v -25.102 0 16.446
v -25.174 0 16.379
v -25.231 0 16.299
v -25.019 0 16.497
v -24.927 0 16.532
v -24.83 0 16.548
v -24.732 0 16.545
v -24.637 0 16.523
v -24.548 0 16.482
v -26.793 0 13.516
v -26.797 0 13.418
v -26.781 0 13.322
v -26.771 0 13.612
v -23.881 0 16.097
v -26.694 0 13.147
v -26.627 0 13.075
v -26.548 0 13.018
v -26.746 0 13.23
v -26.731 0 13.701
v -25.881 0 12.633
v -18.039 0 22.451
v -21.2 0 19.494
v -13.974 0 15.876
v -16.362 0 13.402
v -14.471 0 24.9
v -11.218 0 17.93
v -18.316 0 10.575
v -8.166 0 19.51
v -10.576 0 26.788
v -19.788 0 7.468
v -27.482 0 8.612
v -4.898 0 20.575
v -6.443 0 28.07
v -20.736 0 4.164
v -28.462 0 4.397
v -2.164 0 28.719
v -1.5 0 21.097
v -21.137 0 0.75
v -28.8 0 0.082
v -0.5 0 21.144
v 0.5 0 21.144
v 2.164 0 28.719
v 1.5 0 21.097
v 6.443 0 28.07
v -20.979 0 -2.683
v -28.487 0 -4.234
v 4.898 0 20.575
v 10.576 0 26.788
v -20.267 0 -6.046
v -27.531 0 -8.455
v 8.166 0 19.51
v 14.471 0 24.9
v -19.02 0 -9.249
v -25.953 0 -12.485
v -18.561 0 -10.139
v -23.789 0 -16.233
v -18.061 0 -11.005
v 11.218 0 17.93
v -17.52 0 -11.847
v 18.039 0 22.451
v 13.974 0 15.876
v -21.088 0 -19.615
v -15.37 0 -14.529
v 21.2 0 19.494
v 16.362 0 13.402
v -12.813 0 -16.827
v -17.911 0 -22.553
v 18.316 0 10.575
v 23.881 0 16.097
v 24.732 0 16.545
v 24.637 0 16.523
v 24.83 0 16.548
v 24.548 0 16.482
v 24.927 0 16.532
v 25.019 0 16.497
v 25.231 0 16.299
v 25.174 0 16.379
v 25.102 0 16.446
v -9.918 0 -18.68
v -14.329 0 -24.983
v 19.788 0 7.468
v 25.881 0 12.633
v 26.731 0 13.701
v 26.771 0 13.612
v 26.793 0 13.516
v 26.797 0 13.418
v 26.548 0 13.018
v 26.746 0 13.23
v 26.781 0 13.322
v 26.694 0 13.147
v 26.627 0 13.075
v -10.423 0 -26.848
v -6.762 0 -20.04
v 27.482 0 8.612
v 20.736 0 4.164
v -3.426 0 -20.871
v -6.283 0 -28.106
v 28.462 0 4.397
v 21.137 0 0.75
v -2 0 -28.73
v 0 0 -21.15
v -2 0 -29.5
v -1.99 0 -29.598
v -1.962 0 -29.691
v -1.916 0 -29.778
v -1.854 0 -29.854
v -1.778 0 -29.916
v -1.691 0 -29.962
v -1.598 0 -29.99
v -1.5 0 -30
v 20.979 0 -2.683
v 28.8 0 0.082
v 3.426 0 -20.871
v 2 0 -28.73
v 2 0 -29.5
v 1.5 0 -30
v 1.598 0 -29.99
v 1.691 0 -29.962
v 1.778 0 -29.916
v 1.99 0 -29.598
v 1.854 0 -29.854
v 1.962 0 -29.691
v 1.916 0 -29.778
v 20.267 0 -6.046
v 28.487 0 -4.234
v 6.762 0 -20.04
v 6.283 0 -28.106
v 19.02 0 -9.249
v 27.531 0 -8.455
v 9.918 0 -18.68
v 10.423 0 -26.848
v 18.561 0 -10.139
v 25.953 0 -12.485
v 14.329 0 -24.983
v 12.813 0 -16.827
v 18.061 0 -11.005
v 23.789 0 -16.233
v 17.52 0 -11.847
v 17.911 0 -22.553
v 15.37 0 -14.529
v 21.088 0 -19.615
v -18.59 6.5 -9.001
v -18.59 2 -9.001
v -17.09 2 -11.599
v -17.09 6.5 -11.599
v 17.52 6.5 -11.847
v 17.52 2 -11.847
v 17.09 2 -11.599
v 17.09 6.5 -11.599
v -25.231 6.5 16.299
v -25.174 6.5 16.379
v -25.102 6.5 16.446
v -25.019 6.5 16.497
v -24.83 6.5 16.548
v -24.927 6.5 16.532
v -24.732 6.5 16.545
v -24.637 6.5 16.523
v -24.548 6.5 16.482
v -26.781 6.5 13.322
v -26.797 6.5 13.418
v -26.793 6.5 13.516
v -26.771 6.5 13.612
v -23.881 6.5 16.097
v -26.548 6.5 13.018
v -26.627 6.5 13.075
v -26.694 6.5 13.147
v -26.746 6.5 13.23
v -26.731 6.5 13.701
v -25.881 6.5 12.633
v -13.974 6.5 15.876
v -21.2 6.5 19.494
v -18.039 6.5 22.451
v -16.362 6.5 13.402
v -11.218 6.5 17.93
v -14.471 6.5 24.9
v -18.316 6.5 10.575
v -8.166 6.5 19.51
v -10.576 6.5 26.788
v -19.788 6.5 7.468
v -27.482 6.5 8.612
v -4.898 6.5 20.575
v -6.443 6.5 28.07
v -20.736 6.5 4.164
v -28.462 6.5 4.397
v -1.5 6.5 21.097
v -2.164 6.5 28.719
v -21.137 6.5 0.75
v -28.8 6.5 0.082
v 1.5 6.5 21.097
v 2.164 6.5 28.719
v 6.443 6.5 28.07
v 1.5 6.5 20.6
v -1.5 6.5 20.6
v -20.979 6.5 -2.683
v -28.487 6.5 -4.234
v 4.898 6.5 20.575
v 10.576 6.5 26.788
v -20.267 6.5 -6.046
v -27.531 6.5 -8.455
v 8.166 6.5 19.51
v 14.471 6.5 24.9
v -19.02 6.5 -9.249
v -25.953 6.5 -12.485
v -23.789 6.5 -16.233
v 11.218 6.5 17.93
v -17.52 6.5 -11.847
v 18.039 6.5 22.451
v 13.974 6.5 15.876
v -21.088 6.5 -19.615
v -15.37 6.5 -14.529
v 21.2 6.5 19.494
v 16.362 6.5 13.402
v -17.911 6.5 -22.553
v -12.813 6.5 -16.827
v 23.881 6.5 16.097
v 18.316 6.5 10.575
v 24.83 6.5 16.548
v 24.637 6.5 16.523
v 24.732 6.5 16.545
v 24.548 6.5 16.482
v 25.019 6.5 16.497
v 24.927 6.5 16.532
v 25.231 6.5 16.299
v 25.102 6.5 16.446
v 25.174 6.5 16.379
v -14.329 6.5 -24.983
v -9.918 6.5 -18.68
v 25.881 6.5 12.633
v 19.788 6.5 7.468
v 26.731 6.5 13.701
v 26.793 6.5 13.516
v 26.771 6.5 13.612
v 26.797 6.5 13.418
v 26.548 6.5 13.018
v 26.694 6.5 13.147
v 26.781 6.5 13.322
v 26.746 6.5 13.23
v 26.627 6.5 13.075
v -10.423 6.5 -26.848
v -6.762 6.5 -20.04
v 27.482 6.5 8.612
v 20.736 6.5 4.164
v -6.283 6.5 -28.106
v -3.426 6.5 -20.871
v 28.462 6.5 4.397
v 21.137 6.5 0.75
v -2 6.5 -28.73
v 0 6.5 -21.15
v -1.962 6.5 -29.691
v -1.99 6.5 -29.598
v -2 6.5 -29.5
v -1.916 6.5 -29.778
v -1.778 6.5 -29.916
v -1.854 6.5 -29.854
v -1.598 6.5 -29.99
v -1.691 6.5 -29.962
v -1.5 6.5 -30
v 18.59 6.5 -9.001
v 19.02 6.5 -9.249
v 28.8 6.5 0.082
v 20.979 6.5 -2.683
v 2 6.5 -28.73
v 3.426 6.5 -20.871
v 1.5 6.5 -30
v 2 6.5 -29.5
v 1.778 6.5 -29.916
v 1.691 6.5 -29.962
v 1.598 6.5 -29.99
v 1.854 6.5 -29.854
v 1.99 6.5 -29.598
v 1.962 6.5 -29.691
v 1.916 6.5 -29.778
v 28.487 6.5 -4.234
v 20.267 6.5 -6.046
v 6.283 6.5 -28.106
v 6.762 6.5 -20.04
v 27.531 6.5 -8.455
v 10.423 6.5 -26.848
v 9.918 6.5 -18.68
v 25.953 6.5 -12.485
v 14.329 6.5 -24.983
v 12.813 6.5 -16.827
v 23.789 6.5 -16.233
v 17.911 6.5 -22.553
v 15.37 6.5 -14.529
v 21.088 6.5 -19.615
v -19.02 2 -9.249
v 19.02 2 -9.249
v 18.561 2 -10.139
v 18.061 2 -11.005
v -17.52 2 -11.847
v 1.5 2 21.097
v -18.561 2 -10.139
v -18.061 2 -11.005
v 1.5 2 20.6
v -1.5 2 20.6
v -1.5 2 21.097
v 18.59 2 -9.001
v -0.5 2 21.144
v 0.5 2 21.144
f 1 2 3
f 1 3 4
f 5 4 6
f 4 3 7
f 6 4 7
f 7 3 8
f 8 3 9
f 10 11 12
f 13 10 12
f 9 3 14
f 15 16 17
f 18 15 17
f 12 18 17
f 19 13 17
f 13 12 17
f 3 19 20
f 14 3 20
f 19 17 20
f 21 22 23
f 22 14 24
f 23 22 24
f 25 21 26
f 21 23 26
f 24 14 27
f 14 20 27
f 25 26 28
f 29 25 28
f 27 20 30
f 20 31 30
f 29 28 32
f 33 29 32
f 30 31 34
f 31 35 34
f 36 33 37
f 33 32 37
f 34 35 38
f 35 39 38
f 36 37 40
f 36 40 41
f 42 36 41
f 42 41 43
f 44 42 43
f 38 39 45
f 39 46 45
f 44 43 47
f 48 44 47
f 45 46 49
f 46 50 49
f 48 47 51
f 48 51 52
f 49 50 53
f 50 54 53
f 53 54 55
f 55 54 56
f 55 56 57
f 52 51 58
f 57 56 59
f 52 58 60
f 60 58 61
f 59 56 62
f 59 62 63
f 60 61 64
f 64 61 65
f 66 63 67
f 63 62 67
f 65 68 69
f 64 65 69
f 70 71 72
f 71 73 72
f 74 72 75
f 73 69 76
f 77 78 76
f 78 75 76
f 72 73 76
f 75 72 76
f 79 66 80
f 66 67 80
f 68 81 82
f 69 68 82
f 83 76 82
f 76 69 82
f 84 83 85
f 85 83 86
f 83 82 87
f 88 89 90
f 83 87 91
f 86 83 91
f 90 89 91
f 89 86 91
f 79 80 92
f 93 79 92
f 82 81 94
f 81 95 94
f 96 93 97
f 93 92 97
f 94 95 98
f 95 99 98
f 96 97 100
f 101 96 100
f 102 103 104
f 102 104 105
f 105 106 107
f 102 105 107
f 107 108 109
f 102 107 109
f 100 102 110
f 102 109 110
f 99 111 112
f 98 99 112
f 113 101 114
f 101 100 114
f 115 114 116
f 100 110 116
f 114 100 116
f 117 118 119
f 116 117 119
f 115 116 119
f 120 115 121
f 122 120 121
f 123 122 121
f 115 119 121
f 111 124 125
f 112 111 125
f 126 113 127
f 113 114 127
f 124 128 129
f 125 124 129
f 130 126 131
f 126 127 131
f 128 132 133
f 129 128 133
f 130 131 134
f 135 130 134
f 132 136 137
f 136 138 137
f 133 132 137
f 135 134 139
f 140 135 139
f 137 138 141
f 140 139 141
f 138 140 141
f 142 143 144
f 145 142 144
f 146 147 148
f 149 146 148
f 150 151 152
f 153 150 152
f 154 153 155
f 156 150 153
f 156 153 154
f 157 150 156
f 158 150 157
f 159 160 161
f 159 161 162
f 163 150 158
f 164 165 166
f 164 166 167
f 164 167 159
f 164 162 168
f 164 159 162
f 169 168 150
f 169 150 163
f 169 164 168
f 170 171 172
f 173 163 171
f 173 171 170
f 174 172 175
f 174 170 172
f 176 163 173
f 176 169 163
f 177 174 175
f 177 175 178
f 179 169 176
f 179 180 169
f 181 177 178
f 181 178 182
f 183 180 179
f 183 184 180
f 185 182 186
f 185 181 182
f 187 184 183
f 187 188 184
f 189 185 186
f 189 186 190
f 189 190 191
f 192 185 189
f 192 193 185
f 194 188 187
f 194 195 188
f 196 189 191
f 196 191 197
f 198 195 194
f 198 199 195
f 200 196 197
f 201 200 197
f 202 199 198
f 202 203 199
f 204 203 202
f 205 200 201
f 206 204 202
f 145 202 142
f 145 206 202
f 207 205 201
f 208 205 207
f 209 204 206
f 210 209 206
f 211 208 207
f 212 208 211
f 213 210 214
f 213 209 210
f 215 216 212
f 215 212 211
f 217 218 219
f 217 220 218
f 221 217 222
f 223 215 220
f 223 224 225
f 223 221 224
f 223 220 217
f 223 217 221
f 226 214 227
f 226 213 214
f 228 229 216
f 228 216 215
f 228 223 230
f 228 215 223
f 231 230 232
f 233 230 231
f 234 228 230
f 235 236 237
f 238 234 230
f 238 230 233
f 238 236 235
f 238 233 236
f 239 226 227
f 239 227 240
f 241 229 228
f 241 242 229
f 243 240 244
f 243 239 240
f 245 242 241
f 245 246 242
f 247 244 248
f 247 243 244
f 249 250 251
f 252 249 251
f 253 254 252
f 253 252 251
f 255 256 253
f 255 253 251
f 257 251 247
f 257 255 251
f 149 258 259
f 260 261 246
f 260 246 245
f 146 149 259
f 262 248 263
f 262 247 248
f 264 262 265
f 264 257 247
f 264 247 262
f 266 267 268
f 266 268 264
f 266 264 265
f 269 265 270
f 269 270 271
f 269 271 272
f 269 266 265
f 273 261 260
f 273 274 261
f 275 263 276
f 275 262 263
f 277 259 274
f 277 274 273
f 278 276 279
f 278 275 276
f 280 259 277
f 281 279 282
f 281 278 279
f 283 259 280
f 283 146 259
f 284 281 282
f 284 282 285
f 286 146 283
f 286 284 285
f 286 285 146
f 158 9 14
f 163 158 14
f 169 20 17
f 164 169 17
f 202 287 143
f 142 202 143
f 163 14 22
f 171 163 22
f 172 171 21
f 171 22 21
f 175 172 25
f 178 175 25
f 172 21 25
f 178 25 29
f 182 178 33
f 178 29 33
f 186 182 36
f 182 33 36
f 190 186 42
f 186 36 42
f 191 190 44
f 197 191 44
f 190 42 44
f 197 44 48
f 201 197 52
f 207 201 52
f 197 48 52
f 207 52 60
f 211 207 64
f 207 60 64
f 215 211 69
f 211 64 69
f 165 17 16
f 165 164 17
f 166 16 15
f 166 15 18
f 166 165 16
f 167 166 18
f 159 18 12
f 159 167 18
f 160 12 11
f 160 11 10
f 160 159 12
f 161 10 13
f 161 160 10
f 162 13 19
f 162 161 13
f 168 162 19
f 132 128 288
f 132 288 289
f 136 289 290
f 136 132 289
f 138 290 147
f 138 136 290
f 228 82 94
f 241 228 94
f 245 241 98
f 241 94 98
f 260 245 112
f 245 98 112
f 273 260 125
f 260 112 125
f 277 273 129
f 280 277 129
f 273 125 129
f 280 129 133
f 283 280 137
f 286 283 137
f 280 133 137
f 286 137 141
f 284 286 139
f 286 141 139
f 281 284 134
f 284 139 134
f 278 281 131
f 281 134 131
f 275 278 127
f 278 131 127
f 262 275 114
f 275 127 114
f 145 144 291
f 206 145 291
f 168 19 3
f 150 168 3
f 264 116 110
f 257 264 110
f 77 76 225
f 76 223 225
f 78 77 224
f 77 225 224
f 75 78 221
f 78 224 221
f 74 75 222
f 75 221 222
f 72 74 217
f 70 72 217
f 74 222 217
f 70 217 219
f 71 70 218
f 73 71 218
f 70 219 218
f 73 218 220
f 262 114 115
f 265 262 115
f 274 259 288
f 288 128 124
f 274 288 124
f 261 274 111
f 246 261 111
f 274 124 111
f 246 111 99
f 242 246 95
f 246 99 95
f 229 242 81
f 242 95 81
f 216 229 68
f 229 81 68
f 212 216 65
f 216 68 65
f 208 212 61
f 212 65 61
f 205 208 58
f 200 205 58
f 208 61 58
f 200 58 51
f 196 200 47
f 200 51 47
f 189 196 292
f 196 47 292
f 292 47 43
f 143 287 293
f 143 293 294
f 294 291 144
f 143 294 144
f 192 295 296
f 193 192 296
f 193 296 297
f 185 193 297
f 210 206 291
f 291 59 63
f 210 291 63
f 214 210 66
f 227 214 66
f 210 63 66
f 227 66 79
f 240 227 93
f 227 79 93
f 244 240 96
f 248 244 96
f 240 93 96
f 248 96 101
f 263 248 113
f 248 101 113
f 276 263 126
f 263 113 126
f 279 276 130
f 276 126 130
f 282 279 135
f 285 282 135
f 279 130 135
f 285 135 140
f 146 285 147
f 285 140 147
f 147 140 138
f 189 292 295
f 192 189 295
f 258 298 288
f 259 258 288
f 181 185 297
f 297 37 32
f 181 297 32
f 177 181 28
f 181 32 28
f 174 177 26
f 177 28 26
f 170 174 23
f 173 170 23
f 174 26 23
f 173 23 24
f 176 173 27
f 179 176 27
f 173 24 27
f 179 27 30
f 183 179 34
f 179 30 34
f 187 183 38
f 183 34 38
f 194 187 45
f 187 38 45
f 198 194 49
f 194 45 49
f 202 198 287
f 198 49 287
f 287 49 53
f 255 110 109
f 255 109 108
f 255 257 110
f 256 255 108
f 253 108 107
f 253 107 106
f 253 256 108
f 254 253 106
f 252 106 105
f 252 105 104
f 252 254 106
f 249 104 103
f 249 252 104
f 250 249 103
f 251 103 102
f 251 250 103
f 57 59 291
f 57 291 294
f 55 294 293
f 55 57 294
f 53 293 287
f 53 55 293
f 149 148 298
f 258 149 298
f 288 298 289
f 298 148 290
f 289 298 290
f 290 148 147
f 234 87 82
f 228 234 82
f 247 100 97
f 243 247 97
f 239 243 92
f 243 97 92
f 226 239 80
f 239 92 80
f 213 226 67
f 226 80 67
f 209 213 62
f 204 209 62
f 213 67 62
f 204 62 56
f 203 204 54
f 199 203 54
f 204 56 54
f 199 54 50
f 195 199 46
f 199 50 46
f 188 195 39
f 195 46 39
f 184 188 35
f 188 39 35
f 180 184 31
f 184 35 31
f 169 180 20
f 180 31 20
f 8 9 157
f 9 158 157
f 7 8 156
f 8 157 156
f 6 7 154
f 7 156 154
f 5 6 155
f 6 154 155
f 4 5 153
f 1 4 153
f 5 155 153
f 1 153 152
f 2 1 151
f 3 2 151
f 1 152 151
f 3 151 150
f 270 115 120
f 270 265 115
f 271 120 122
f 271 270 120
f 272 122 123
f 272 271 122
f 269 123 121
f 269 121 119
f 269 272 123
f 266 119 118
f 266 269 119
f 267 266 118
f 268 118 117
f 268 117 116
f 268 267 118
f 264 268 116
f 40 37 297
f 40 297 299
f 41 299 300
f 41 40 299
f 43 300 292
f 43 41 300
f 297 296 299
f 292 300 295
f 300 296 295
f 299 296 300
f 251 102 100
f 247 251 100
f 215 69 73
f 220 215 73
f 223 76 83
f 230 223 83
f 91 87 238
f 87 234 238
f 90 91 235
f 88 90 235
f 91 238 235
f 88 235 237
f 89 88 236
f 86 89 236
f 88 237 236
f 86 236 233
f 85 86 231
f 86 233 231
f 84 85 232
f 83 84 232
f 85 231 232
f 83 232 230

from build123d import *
from build123d.topology import SkipClean

# Parameters (mm, degrees)
BOSS_EXTRUDE1_DEPTH = 6.5
FILLET1_R           = 0.5
CUT_EXTRUDE1_DEPTH  = 2


with BuildPart() as part:
    # Sketch1 → Boss-Extrude1 (new body)
    with BuildSketch(Plane(origin=(0, 0, 0), x_dir=(1, 0, 0), z_dir=(0, 1, 0))):
        with BuildLine():
            ThreePointArc((25.881318293, -12.633185007), (24.941531629, 14.4), (2, 28.730471629))
            Line((2, 28.730471629), (2, 30))
            Line((2, 30), (-2, 30))
            Line((-2, 30), (-2, 28.730471629))
            ThreePointArc((-2, 28.730471629), (-24.941531629, 14.4), (-25.881318293, -12.633185007))
            Line((-25.881318293, -12.633185007), (-26.980762114, -13.267949192))
            Line((-26.980762114, -13.267949192), (-24.980762114, -16.732050808))
            Line((-24.980762114, -16.732050808), (-23.881318293, -16.097286622))
            ThreePointArc((-23.881318293, -16.097286622), (0, -28.8), (23.881318293, -16.097286622))
            Line((23.881318293, -16.097286622), (24.980762114, -16.732050808))
            Line((24.980762114, -16.732050808), (26.980762114, -13.267949192))
            Line((26.980762114, -13.267949192), (25.881318293, -12.633185007))
        make_face()
        with BuildLine():
            ThreePointArc((-1.5, -21.096741455), (-18.31643729, -10.575), (-19.020314037, 9.249332622))
            Line((-19.020314037, 9.249332622), (-18.590123318, 9.000961894))
            Line((-18.590123318, 9.000961894), (-17.090123318, 11.599038106))
            Line((-17.090123318, 11.599038106), (-17.520314037, 11.847408833))
            ThreePointArc((-17.520314037, 11.847408833), (0, 21.15), (17.520314037, 11.847408833))
            Line((17.520314037, 11.847408833), (17.090123318, 11.599038106))
            Line((17.090123318, 11.599038106), (18.590123318, 9.000961894))
            Line((18.590123318, 9.000961894), (19.020314037, 9.249332622))
            ThreePointArc((19.020314037, 9.249332622), (18.31643729, -10.575), (1.5, -21.096741455))
            Line((1.5, -21.096741455), (1.5, -20.6))
            Line((1.5, -20.6), (-1.5, -20.6))
            Line((-1.5, -20.6), (-1.5, -21.096741455))
        make_face(mode=Mode.SUBTRACT)
    extrude(amount=BOSS_EXTRUDE1_DEPTH)

    # Fillet1
    fillet1_edges = [part.edges().sort_by_distance(p)[0] for p in [
        (-24.980762114, 3.25, 16.732050808),
        (-26.980762114, 3.25, 13.267949192),
        (-2, 3.25, -30),
        (2, 3.25, -30),
        (26.980762114, 3.25, 13.267949192),
        (24.980762114, 3.25, 16.732050808),
    ]]
    fillet(fillet1_edges, radius=FILLET1_R)

    # Sketch1<5> → Cut-Extrude1 (cut)
    with SkipClean():  # the faces are left unmerged after this step: merging them gives an invalid solid
        with BuildSketch(Plane(origin=(0, 0, 0), x_dir=(1, 0, 0), z_dir=(0, 1, 0))):
            with BuildLine():
                Line((-1.5, -20.6), (-1.5, -21.096741455))
                ThreePointArc((-1.5, -21.096741455), (0, -21.15), (1.5, -21.096741455))
                Line((1.5, -21.096741455), (1.5, -20.6))
                Line((1.5, -20.6), (-1.5, -20.6))
            make_face()
            with BuildLine():
                ThreePointArc((-17.520314037, 11.847408833), (-18.31643729, 10.575), (-19.020314037, 9.249332622))
                Line((-19.020314037, 9.249332622), (-18.590123318, 9.000961894))
                Line((-18.590123318, 9.000961894), (-17.090123318, 11.599038106))
                Line((-17.090123318, 11.599038106), (-17.520314037, 11.847408833))
            make_face()
            with BuildLine():
                Line((18.590123318, 9.000961894), (19.020314037, 9.249332622))
                ThreePointArc((19.020314037, 9.249332622), (18.31643729, 10.575), (17.520314037, 11.847408833))
                Line((17.520314037, 11.847408833), (17.090123318, 11.599038106))
                Line((17.090123318, 11.599038106), (18.590123318, 9.000961894))
            make_face()
        extrude(amount=CUT_EXTRUDE1_DEPTH, mode=Mode.SUBTRACT)


solid = part.part
